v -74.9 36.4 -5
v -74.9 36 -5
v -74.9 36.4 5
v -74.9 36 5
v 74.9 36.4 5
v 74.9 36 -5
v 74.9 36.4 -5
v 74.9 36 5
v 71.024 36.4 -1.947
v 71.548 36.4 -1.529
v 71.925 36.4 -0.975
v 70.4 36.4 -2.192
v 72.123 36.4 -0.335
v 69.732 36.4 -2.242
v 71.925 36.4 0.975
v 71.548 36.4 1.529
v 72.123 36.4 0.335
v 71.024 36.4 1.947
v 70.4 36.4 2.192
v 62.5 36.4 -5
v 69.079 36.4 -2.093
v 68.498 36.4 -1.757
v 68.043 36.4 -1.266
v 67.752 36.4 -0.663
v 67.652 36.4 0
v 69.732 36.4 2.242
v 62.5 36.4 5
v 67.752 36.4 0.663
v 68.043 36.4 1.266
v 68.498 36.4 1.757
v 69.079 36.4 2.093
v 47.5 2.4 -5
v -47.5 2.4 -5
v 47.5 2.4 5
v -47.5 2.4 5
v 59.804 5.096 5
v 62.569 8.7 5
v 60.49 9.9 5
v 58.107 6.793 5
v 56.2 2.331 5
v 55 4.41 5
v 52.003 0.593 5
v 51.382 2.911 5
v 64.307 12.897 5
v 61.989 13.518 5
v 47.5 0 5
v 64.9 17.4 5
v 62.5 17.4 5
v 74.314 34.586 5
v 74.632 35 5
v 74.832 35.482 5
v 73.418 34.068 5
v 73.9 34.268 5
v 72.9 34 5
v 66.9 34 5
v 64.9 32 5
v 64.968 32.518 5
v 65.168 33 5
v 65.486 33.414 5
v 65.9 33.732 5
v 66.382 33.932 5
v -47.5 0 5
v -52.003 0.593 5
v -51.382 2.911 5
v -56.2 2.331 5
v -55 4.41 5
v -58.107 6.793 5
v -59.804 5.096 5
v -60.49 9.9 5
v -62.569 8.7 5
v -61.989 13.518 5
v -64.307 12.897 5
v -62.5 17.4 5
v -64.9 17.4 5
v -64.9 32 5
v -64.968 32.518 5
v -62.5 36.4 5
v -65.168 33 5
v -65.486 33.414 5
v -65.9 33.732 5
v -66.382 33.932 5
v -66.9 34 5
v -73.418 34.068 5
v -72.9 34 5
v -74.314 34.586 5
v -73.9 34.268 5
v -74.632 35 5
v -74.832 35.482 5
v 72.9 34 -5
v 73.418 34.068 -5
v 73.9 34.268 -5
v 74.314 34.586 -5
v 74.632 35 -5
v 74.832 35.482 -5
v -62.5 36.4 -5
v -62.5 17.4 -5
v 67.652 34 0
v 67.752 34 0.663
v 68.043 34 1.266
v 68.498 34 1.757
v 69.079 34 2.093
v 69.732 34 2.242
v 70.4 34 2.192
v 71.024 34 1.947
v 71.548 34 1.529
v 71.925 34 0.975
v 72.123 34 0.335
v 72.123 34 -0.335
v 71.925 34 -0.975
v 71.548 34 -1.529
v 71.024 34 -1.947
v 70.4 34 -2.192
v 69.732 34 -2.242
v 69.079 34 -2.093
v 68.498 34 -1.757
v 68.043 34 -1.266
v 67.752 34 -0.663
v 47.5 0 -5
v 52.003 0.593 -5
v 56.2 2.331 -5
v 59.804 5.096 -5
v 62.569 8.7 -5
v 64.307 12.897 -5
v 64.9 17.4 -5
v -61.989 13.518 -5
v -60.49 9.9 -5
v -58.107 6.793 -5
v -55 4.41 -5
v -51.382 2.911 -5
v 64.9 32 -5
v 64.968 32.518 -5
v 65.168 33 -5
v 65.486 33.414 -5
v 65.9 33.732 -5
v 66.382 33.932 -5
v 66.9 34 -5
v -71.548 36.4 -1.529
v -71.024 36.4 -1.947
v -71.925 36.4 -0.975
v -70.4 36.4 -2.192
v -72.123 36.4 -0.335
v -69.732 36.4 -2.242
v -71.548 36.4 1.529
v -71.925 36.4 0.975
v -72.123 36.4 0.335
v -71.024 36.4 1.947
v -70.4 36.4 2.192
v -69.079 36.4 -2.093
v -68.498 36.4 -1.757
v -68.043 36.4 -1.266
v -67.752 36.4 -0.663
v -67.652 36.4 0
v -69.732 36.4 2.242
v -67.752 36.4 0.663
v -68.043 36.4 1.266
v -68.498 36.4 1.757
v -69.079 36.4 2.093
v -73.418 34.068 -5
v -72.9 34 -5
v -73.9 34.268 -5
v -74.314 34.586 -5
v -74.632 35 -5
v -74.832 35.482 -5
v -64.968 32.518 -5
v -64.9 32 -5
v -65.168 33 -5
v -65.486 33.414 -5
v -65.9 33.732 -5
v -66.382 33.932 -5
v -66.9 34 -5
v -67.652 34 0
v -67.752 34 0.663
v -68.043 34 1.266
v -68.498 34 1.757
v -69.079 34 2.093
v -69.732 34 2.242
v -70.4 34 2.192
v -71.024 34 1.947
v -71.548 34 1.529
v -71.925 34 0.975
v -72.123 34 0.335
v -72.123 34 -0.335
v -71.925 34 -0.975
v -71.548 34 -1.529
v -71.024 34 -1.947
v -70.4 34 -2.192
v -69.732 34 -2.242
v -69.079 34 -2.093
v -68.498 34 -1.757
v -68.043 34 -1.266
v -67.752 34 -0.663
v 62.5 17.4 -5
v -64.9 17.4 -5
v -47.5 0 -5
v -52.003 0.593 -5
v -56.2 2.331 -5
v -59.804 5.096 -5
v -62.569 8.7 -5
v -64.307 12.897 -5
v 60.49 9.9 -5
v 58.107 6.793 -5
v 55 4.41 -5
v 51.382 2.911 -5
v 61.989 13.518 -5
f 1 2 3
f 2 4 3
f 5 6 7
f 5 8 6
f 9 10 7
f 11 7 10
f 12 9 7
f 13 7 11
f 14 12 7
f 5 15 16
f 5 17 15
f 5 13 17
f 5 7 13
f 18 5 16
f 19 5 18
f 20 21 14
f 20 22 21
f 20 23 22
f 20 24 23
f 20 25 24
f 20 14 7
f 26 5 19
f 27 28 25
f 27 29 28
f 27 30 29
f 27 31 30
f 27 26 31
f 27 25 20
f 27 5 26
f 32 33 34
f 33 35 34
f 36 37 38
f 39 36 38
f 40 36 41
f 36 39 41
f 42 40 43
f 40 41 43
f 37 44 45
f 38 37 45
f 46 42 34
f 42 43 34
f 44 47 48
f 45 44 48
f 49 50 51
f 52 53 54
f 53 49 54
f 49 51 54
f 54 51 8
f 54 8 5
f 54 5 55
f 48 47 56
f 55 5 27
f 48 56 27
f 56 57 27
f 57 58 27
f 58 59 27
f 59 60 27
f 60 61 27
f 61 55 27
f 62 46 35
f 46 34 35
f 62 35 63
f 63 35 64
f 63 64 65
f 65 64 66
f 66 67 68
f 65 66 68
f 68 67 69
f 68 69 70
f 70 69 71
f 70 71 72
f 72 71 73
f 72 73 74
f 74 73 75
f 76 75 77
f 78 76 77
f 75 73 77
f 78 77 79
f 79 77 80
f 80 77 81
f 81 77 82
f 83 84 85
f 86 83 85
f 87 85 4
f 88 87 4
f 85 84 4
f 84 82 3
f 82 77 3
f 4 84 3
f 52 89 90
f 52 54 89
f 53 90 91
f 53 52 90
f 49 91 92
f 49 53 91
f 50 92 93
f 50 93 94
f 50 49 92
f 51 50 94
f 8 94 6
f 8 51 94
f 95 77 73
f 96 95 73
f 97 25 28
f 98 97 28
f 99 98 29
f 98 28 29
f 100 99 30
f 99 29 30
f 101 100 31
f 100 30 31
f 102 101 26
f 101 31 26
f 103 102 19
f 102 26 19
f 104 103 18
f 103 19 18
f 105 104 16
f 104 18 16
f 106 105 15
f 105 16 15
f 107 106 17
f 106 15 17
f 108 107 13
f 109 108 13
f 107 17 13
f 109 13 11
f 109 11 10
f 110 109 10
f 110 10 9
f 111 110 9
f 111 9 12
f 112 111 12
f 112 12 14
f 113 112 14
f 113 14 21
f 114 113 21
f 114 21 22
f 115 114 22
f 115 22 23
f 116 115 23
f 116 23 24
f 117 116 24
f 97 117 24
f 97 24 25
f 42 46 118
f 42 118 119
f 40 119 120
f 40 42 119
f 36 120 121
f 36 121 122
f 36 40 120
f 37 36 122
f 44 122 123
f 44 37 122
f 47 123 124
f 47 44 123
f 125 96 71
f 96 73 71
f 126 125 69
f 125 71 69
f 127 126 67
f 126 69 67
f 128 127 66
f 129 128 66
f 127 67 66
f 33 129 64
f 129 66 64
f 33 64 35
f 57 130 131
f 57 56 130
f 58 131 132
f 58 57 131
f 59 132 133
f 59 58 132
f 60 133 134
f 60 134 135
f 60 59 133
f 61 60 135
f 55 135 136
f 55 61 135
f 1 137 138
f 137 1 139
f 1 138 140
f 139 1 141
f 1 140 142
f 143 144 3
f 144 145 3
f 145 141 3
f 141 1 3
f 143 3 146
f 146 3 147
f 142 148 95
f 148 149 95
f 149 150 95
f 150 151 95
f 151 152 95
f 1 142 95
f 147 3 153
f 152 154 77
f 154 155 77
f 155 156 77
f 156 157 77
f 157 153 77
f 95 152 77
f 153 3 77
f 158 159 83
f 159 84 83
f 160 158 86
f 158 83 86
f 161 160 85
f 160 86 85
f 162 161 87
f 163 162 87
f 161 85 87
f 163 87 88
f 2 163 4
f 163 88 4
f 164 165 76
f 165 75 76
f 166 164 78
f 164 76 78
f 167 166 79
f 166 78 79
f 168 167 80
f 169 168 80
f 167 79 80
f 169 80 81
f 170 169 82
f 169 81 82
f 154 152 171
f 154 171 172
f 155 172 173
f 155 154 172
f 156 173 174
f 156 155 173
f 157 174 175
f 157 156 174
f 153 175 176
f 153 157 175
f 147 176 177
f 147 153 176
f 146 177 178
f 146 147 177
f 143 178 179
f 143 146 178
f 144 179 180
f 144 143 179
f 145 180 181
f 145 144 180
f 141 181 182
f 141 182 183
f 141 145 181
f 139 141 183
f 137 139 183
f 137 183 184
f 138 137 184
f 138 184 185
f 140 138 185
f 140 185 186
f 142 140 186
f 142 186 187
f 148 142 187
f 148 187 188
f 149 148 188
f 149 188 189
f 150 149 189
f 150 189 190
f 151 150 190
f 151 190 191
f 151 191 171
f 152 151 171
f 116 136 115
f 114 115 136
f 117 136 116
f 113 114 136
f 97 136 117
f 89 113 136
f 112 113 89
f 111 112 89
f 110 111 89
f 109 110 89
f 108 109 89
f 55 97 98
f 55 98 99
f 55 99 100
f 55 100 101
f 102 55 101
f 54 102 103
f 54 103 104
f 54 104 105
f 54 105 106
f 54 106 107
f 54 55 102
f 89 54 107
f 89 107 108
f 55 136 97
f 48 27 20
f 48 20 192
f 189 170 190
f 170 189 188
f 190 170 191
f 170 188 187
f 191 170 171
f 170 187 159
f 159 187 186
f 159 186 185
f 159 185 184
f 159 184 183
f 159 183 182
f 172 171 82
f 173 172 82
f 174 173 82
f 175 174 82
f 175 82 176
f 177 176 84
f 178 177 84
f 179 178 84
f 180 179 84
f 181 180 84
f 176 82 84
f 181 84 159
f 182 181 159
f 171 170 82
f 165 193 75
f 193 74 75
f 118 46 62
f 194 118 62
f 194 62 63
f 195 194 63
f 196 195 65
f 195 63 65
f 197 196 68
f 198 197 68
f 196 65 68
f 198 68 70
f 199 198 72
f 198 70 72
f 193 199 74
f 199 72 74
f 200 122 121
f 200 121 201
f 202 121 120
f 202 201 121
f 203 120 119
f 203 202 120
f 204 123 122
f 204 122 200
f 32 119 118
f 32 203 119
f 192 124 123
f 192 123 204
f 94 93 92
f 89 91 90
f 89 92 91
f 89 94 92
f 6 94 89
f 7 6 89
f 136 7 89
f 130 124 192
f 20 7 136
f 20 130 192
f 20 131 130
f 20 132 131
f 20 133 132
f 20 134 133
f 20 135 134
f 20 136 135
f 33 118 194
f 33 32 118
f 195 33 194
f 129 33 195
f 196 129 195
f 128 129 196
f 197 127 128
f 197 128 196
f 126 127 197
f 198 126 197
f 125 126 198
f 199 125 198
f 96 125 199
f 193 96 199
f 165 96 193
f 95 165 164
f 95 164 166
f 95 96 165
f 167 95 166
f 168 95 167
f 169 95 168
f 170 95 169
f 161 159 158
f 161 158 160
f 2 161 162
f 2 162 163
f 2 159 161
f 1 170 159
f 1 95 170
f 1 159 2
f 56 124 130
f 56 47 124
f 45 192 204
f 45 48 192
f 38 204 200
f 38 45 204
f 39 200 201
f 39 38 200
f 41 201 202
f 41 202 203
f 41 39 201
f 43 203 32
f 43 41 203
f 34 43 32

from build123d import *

# Parameters (mm, degrees)
F1_DEPTH = 5
F3_D     = 4.4958
F4_R     = 2


with BuildPart() as f1:
    # F0 (on Top) → F1 (new body, symmetric)
    with BuildSketch(Plane.XY):
        with BuildLine():
            Line((0, 2.4), (0, 0))
            Line((0, 0), (47.5, 0))
            ThreePointArc((47.5, 0), (59.8036579926, 5.0963420074), (64.9, 17.4))
            Line((64.9, 17.4), (64.9, 34))
            Line((64.9, 34), (74.9, 34))
            Line((74.9, 34), (74.9, 36.4))
            Line((74.9, 36.4), (62.5, 36.4))
            Line((62.5, 36.4), (62.5, 17.4))
            ThreePointArc((62.5, 17.4), (58.1066017178, 6.7933982822), (47.5, 2.4))
            Line((47.5, 2.4), (0, 2.4))
        make_face()
    extrude(amount=F1_DEPTH, both=True)

    # F3 (through all)
    with Locations(Plane.XZ.offset(-34)):
        with Locations((69.9, 0)):
            Hole(F3_D / 2)

    # F4
    f4_edges = [f1.edges().sort_by_distance(p)[0] for p in [
        (64.9, 34, 0),
        (74.9, 34, 0),
    ]]
    fillet(f4_edges, radius=F4_R)

    # F5: F1 across face


with BuildPart() as f1_1:
    add(f1.part)
    add(f1.part.mirror(Plane(origin=(0, 1.2, 0), x_dir=(0, -1, 0), z_dir=(-1, 0, 0))))


solid = f1_1.part
